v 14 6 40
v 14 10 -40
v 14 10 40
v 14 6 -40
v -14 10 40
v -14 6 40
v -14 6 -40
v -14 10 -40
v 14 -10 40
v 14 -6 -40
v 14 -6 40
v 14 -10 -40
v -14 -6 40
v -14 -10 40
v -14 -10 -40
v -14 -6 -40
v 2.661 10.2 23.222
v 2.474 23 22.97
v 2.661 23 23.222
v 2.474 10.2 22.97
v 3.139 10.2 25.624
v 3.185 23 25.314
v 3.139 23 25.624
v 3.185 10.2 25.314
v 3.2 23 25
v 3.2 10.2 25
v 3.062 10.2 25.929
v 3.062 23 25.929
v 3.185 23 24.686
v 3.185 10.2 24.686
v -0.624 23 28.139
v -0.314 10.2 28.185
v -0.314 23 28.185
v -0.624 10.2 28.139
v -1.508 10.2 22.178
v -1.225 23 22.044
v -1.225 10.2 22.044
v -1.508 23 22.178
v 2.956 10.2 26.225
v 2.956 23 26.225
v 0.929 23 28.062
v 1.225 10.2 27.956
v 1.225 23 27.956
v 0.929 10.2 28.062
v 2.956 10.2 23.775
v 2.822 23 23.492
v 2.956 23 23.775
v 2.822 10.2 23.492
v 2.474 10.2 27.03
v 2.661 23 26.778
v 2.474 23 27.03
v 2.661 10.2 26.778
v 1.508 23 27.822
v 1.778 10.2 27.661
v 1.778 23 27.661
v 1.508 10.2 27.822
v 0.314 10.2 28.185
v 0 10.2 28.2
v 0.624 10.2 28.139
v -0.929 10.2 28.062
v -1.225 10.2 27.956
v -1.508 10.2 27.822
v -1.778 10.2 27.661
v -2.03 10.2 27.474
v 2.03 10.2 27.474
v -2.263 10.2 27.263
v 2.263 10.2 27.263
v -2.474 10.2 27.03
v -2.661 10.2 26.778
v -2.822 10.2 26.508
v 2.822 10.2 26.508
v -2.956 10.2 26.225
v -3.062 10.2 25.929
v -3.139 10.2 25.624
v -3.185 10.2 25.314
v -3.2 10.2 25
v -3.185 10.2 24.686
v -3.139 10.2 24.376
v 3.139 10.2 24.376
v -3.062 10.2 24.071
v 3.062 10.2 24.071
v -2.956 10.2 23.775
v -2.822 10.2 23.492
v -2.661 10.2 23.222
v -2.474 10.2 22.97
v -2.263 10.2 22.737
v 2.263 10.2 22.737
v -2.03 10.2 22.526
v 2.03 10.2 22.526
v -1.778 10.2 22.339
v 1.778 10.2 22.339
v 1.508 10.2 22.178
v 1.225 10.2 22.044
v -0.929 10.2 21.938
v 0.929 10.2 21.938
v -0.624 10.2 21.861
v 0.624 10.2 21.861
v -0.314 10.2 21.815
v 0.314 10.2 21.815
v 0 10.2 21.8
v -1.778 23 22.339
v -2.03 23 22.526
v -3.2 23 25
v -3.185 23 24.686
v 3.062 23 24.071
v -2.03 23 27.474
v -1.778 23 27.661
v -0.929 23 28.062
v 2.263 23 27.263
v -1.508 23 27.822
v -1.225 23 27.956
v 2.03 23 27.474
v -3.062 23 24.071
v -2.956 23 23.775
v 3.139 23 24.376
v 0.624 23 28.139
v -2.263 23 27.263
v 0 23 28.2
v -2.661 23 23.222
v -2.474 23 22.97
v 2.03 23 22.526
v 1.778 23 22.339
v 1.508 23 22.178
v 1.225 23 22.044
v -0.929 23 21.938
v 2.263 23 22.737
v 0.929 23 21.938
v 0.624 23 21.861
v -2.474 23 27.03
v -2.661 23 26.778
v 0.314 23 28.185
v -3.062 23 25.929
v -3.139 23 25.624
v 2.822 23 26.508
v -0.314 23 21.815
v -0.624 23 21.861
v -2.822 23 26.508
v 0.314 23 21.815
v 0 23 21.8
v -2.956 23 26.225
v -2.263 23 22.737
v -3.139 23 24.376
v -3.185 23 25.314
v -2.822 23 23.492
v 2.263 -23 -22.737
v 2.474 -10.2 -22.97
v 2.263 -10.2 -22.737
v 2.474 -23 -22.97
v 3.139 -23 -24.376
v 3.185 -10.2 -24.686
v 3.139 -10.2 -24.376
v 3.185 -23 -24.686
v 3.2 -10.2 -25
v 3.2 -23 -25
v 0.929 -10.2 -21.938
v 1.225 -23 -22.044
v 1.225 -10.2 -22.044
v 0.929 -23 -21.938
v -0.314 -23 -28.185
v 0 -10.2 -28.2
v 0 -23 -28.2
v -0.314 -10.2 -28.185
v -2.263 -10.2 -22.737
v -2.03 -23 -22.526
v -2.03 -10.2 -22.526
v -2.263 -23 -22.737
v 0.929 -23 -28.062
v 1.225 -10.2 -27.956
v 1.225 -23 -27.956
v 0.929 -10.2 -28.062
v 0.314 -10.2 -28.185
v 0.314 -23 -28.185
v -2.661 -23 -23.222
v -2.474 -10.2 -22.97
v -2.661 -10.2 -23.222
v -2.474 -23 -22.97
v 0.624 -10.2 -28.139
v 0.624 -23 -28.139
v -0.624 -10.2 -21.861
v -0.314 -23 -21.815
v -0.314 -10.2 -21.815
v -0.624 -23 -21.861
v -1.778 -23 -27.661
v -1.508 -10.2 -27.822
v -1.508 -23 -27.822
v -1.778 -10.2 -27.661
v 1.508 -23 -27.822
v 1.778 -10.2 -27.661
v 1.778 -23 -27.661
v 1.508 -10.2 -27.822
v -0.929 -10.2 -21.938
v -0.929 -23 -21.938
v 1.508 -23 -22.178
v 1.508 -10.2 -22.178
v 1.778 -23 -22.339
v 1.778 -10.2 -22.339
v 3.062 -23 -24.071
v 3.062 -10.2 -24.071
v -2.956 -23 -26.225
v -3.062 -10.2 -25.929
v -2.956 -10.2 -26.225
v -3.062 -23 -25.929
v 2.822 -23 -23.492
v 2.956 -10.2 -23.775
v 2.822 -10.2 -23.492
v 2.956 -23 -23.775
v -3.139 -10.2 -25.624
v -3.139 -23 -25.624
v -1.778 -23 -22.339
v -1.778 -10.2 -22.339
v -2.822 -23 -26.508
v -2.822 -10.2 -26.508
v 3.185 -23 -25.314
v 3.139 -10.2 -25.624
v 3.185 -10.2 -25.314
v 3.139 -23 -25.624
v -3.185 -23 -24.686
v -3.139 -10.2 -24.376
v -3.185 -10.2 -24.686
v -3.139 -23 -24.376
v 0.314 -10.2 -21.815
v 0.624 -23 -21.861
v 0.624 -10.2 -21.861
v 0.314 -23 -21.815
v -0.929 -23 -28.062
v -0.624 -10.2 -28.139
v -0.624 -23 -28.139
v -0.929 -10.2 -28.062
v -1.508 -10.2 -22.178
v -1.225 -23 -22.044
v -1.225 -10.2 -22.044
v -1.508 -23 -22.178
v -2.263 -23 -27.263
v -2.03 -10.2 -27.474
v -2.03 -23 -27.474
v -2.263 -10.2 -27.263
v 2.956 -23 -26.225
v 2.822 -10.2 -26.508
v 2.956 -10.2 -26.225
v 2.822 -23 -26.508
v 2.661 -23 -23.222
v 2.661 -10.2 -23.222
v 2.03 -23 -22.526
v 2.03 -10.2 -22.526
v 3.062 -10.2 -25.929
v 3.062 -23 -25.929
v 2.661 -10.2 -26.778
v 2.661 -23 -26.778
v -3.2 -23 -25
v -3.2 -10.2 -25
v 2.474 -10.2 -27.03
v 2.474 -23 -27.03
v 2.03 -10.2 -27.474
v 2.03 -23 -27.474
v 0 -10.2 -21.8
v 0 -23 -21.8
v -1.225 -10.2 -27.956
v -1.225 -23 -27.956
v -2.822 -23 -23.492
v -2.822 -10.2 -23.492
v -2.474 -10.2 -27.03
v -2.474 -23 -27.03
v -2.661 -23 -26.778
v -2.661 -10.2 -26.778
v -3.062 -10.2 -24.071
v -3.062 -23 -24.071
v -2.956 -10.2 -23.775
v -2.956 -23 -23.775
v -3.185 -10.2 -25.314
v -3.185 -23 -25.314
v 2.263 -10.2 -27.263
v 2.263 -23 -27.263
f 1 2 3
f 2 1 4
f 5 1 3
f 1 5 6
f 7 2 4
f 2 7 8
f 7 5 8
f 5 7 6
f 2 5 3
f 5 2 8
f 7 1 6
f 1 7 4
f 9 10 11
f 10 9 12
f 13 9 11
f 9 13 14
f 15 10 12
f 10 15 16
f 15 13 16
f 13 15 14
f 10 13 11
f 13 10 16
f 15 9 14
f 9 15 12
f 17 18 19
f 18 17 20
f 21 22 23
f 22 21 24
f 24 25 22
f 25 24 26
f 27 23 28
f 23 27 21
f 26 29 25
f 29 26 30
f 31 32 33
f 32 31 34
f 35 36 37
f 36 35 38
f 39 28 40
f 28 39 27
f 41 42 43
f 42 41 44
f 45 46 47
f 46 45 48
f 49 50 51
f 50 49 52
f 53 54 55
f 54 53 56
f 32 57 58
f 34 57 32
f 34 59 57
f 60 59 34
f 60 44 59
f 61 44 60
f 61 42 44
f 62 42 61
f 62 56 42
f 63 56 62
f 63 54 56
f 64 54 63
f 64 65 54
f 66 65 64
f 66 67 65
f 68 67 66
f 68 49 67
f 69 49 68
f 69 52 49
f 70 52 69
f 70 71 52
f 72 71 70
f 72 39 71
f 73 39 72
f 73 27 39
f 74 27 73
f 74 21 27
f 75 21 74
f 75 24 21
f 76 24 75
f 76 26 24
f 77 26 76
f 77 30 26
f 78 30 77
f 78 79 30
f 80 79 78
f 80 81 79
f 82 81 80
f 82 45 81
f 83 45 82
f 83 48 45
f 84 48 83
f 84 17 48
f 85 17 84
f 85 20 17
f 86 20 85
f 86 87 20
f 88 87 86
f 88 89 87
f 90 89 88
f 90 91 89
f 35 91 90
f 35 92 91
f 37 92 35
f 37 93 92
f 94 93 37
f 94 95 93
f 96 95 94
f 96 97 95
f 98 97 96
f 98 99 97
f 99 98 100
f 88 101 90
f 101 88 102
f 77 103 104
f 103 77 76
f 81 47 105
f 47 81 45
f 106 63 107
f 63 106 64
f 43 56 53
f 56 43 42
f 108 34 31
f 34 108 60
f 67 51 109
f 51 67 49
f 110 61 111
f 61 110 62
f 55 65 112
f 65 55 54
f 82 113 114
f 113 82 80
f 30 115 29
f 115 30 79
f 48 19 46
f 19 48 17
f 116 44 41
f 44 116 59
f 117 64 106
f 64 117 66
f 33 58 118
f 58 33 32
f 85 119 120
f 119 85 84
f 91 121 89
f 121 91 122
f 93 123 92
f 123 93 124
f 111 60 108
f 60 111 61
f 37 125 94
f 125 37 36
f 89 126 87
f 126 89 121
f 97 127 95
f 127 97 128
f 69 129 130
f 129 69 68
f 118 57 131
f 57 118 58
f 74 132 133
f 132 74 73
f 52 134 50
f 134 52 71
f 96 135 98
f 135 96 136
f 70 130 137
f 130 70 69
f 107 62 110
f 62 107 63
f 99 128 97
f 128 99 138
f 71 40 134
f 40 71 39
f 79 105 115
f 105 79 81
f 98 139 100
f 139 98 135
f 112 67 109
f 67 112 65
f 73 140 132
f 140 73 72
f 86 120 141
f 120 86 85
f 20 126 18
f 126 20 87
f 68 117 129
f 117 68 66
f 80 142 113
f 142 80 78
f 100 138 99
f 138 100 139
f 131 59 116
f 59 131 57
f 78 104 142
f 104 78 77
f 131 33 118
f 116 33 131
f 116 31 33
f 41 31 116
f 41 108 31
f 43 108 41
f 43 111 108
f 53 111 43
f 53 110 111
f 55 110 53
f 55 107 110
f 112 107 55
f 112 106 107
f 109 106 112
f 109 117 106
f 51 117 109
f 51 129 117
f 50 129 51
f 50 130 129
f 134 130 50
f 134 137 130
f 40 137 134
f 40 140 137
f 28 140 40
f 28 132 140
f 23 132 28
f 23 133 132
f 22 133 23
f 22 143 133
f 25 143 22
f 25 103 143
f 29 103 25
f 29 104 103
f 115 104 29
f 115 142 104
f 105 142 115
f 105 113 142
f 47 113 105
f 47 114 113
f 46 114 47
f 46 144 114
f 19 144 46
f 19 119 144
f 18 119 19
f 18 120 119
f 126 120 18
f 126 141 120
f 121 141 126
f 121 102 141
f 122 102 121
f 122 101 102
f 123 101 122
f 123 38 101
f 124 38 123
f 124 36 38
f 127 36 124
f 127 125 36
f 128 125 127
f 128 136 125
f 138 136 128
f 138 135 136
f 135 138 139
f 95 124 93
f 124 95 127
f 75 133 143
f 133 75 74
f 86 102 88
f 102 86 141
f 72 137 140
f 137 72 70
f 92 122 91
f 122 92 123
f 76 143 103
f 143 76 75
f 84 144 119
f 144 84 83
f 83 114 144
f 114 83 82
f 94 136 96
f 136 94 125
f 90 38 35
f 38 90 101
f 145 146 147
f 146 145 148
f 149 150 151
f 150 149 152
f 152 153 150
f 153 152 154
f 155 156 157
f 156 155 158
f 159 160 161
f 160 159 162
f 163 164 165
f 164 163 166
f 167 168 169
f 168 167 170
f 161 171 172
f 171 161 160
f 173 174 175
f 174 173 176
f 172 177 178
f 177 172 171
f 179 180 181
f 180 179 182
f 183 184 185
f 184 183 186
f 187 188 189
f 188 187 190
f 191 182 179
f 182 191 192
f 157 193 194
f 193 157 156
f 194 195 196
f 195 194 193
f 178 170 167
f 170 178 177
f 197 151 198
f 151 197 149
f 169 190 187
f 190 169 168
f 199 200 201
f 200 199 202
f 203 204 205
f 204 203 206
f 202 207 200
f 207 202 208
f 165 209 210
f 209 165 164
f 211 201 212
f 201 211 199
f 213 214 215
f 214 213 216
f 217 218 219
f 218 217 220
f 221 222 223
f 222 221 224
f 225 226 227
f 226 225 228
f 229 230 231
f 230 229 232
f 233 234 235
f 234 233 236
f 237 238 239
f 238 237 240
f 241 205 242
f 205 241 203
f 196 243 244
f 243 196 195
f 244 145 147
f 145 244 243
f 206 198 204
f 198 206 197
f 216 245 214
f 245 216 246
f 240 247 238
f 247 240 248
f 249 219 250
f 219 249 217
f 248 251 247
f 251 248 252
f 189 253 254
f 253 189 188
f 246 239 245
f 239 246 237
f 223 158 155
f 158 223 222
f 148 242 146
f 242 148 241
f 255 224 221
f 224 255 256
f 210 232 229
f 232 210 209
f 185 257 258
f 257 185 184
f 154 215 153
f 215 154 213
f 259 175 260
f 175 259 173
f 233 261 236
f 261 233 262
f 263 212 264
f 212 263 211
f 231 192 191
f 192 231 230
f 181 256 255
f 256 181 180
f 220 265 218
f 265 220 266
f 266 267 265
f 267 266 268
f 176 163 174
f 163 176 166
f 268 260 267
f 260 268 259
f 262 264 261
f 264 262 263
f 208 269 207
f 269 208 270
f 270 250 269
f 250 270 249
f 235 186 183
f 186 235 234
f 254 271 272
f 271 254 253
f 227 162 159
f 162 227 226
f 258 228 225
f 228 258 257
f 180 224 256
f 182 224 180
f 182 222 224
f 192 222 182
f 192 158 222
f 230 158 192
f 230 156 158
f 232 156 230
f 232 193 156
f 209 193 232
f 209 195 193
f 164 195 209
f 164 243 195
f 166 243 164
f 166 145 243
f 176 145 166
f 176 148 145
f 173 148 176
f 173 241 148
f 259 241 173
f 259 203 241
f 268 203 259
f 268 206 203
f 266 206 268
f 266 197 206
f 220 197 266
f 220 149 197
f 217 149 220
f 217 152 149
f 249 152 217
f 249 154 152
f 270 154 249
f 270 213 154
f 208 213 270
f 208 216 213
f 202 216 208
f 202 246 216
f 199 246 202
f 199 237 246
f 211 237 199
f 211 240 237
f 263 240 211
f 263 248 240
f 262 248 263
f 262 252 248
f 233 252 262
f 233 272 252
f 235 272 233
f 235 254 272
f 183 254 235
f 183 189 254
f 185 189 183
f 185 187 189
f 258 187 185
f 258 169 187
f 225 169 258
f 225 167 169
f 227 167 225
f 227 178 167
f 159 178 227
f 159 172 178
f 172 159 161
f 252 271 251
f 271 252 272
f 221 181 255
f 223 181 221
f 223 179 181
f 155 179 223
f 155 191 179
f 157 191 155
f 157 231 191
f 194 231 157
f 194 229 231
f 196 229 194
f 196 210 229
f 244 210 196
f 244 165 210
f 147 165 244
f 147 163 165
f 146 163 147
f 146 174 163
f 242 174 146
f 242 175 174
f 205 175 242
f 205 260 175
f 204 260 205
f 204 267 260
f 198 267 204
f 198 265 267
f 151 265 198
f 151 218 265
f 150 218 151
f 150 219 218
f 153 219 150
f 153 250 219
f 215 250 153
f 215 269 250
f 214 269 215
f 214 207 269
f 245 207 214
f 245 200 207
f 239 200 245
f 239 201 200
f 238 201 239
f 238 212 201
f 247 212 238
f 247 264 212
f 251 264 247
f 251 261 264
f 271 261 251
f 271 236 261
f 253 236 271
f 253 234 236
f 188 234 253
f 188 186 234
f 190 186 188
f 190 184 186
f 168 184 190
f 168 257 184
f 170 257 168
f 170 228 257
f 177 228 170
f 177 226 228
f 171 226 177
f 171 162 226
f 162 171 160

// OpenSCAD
// ============================================================================
// Atom Lithography Machine — Parametric OpenSCAD Module (S1.2-02)
// ============================================================================
// part_id           : S1.2-02
// parent_bom_id     : S1.2
// subsystem         : S1
// part_name         : Wien filtresi elektrostatik saptirma plakalari
// material          : OFHC Cu
// temp_stage        : 300 K
// vacuum_grade      : UHV 1e-8 mbar
// tolerance         : ±10 um paralellik
// computed_mass_kg  : 0.17276
// envelope_mm       : 28.000 x 46.000 x 80.000
// design_maturity   : M0_M1_DETAILED_CAD_DESIGN_ONLY
// no_lab_measurement: true
// iec61508_certified: false
// semi_s2_certified : false
// Units: millimeters (mm)
// ============================================================================

$fn = 64;

// Nominal bounding envelope parameters (mm)
bbox_x = 28.0000;
bbox_y = 46.0000;
bbox_z = 80.0000;

// Part-specific parametric dimensions
plate_l = 80.0;
plate_w = 28.0;
e_gap = 12.0;
e_field_kV_m = 112.32;
v_plate_nom_V = 1347.85;
nominal_steer_mrad = 0.0;

// Interface / port parameters (mm)
port_eplate_hv_pos_od = 6.400;
port_eplate_hv_neg_od = 6.400;

module part_S1_2_02() {
  union() {
    // +Y E-field deflection plate (12.0 mm gap)
    translate([0.000, 8.000, 0.000]) cube([28.000, 4.000, 80.000], center=true);
    // -Y E-field deflection plate (12.0 mm gap)
    translate([0.000, -8.000, 0.000]) cube([28.000, 4.000, 80.000], center=true);
    // Macor HV standoff
    translate([0.000, 16.600, 25.000]) rotate([90.000, 0.000, 0.000]) cylinder(d=6.400, h=12.800, center=true);
    // Macor HV standoff
    translate([0.000, -16.600, -25.000]) rotate([90.000, 0.000, 0.000]) cylinder(d=6.400, h=12.800, center=true);
  }
}

// World assembly mounting transform (global machine frame, mm / deg):
// translate([0.000, 0.000, 310.000]) rotate([0.000, 0.000, 0.000]) part_S1_2_02();

part_S1_2_02();
